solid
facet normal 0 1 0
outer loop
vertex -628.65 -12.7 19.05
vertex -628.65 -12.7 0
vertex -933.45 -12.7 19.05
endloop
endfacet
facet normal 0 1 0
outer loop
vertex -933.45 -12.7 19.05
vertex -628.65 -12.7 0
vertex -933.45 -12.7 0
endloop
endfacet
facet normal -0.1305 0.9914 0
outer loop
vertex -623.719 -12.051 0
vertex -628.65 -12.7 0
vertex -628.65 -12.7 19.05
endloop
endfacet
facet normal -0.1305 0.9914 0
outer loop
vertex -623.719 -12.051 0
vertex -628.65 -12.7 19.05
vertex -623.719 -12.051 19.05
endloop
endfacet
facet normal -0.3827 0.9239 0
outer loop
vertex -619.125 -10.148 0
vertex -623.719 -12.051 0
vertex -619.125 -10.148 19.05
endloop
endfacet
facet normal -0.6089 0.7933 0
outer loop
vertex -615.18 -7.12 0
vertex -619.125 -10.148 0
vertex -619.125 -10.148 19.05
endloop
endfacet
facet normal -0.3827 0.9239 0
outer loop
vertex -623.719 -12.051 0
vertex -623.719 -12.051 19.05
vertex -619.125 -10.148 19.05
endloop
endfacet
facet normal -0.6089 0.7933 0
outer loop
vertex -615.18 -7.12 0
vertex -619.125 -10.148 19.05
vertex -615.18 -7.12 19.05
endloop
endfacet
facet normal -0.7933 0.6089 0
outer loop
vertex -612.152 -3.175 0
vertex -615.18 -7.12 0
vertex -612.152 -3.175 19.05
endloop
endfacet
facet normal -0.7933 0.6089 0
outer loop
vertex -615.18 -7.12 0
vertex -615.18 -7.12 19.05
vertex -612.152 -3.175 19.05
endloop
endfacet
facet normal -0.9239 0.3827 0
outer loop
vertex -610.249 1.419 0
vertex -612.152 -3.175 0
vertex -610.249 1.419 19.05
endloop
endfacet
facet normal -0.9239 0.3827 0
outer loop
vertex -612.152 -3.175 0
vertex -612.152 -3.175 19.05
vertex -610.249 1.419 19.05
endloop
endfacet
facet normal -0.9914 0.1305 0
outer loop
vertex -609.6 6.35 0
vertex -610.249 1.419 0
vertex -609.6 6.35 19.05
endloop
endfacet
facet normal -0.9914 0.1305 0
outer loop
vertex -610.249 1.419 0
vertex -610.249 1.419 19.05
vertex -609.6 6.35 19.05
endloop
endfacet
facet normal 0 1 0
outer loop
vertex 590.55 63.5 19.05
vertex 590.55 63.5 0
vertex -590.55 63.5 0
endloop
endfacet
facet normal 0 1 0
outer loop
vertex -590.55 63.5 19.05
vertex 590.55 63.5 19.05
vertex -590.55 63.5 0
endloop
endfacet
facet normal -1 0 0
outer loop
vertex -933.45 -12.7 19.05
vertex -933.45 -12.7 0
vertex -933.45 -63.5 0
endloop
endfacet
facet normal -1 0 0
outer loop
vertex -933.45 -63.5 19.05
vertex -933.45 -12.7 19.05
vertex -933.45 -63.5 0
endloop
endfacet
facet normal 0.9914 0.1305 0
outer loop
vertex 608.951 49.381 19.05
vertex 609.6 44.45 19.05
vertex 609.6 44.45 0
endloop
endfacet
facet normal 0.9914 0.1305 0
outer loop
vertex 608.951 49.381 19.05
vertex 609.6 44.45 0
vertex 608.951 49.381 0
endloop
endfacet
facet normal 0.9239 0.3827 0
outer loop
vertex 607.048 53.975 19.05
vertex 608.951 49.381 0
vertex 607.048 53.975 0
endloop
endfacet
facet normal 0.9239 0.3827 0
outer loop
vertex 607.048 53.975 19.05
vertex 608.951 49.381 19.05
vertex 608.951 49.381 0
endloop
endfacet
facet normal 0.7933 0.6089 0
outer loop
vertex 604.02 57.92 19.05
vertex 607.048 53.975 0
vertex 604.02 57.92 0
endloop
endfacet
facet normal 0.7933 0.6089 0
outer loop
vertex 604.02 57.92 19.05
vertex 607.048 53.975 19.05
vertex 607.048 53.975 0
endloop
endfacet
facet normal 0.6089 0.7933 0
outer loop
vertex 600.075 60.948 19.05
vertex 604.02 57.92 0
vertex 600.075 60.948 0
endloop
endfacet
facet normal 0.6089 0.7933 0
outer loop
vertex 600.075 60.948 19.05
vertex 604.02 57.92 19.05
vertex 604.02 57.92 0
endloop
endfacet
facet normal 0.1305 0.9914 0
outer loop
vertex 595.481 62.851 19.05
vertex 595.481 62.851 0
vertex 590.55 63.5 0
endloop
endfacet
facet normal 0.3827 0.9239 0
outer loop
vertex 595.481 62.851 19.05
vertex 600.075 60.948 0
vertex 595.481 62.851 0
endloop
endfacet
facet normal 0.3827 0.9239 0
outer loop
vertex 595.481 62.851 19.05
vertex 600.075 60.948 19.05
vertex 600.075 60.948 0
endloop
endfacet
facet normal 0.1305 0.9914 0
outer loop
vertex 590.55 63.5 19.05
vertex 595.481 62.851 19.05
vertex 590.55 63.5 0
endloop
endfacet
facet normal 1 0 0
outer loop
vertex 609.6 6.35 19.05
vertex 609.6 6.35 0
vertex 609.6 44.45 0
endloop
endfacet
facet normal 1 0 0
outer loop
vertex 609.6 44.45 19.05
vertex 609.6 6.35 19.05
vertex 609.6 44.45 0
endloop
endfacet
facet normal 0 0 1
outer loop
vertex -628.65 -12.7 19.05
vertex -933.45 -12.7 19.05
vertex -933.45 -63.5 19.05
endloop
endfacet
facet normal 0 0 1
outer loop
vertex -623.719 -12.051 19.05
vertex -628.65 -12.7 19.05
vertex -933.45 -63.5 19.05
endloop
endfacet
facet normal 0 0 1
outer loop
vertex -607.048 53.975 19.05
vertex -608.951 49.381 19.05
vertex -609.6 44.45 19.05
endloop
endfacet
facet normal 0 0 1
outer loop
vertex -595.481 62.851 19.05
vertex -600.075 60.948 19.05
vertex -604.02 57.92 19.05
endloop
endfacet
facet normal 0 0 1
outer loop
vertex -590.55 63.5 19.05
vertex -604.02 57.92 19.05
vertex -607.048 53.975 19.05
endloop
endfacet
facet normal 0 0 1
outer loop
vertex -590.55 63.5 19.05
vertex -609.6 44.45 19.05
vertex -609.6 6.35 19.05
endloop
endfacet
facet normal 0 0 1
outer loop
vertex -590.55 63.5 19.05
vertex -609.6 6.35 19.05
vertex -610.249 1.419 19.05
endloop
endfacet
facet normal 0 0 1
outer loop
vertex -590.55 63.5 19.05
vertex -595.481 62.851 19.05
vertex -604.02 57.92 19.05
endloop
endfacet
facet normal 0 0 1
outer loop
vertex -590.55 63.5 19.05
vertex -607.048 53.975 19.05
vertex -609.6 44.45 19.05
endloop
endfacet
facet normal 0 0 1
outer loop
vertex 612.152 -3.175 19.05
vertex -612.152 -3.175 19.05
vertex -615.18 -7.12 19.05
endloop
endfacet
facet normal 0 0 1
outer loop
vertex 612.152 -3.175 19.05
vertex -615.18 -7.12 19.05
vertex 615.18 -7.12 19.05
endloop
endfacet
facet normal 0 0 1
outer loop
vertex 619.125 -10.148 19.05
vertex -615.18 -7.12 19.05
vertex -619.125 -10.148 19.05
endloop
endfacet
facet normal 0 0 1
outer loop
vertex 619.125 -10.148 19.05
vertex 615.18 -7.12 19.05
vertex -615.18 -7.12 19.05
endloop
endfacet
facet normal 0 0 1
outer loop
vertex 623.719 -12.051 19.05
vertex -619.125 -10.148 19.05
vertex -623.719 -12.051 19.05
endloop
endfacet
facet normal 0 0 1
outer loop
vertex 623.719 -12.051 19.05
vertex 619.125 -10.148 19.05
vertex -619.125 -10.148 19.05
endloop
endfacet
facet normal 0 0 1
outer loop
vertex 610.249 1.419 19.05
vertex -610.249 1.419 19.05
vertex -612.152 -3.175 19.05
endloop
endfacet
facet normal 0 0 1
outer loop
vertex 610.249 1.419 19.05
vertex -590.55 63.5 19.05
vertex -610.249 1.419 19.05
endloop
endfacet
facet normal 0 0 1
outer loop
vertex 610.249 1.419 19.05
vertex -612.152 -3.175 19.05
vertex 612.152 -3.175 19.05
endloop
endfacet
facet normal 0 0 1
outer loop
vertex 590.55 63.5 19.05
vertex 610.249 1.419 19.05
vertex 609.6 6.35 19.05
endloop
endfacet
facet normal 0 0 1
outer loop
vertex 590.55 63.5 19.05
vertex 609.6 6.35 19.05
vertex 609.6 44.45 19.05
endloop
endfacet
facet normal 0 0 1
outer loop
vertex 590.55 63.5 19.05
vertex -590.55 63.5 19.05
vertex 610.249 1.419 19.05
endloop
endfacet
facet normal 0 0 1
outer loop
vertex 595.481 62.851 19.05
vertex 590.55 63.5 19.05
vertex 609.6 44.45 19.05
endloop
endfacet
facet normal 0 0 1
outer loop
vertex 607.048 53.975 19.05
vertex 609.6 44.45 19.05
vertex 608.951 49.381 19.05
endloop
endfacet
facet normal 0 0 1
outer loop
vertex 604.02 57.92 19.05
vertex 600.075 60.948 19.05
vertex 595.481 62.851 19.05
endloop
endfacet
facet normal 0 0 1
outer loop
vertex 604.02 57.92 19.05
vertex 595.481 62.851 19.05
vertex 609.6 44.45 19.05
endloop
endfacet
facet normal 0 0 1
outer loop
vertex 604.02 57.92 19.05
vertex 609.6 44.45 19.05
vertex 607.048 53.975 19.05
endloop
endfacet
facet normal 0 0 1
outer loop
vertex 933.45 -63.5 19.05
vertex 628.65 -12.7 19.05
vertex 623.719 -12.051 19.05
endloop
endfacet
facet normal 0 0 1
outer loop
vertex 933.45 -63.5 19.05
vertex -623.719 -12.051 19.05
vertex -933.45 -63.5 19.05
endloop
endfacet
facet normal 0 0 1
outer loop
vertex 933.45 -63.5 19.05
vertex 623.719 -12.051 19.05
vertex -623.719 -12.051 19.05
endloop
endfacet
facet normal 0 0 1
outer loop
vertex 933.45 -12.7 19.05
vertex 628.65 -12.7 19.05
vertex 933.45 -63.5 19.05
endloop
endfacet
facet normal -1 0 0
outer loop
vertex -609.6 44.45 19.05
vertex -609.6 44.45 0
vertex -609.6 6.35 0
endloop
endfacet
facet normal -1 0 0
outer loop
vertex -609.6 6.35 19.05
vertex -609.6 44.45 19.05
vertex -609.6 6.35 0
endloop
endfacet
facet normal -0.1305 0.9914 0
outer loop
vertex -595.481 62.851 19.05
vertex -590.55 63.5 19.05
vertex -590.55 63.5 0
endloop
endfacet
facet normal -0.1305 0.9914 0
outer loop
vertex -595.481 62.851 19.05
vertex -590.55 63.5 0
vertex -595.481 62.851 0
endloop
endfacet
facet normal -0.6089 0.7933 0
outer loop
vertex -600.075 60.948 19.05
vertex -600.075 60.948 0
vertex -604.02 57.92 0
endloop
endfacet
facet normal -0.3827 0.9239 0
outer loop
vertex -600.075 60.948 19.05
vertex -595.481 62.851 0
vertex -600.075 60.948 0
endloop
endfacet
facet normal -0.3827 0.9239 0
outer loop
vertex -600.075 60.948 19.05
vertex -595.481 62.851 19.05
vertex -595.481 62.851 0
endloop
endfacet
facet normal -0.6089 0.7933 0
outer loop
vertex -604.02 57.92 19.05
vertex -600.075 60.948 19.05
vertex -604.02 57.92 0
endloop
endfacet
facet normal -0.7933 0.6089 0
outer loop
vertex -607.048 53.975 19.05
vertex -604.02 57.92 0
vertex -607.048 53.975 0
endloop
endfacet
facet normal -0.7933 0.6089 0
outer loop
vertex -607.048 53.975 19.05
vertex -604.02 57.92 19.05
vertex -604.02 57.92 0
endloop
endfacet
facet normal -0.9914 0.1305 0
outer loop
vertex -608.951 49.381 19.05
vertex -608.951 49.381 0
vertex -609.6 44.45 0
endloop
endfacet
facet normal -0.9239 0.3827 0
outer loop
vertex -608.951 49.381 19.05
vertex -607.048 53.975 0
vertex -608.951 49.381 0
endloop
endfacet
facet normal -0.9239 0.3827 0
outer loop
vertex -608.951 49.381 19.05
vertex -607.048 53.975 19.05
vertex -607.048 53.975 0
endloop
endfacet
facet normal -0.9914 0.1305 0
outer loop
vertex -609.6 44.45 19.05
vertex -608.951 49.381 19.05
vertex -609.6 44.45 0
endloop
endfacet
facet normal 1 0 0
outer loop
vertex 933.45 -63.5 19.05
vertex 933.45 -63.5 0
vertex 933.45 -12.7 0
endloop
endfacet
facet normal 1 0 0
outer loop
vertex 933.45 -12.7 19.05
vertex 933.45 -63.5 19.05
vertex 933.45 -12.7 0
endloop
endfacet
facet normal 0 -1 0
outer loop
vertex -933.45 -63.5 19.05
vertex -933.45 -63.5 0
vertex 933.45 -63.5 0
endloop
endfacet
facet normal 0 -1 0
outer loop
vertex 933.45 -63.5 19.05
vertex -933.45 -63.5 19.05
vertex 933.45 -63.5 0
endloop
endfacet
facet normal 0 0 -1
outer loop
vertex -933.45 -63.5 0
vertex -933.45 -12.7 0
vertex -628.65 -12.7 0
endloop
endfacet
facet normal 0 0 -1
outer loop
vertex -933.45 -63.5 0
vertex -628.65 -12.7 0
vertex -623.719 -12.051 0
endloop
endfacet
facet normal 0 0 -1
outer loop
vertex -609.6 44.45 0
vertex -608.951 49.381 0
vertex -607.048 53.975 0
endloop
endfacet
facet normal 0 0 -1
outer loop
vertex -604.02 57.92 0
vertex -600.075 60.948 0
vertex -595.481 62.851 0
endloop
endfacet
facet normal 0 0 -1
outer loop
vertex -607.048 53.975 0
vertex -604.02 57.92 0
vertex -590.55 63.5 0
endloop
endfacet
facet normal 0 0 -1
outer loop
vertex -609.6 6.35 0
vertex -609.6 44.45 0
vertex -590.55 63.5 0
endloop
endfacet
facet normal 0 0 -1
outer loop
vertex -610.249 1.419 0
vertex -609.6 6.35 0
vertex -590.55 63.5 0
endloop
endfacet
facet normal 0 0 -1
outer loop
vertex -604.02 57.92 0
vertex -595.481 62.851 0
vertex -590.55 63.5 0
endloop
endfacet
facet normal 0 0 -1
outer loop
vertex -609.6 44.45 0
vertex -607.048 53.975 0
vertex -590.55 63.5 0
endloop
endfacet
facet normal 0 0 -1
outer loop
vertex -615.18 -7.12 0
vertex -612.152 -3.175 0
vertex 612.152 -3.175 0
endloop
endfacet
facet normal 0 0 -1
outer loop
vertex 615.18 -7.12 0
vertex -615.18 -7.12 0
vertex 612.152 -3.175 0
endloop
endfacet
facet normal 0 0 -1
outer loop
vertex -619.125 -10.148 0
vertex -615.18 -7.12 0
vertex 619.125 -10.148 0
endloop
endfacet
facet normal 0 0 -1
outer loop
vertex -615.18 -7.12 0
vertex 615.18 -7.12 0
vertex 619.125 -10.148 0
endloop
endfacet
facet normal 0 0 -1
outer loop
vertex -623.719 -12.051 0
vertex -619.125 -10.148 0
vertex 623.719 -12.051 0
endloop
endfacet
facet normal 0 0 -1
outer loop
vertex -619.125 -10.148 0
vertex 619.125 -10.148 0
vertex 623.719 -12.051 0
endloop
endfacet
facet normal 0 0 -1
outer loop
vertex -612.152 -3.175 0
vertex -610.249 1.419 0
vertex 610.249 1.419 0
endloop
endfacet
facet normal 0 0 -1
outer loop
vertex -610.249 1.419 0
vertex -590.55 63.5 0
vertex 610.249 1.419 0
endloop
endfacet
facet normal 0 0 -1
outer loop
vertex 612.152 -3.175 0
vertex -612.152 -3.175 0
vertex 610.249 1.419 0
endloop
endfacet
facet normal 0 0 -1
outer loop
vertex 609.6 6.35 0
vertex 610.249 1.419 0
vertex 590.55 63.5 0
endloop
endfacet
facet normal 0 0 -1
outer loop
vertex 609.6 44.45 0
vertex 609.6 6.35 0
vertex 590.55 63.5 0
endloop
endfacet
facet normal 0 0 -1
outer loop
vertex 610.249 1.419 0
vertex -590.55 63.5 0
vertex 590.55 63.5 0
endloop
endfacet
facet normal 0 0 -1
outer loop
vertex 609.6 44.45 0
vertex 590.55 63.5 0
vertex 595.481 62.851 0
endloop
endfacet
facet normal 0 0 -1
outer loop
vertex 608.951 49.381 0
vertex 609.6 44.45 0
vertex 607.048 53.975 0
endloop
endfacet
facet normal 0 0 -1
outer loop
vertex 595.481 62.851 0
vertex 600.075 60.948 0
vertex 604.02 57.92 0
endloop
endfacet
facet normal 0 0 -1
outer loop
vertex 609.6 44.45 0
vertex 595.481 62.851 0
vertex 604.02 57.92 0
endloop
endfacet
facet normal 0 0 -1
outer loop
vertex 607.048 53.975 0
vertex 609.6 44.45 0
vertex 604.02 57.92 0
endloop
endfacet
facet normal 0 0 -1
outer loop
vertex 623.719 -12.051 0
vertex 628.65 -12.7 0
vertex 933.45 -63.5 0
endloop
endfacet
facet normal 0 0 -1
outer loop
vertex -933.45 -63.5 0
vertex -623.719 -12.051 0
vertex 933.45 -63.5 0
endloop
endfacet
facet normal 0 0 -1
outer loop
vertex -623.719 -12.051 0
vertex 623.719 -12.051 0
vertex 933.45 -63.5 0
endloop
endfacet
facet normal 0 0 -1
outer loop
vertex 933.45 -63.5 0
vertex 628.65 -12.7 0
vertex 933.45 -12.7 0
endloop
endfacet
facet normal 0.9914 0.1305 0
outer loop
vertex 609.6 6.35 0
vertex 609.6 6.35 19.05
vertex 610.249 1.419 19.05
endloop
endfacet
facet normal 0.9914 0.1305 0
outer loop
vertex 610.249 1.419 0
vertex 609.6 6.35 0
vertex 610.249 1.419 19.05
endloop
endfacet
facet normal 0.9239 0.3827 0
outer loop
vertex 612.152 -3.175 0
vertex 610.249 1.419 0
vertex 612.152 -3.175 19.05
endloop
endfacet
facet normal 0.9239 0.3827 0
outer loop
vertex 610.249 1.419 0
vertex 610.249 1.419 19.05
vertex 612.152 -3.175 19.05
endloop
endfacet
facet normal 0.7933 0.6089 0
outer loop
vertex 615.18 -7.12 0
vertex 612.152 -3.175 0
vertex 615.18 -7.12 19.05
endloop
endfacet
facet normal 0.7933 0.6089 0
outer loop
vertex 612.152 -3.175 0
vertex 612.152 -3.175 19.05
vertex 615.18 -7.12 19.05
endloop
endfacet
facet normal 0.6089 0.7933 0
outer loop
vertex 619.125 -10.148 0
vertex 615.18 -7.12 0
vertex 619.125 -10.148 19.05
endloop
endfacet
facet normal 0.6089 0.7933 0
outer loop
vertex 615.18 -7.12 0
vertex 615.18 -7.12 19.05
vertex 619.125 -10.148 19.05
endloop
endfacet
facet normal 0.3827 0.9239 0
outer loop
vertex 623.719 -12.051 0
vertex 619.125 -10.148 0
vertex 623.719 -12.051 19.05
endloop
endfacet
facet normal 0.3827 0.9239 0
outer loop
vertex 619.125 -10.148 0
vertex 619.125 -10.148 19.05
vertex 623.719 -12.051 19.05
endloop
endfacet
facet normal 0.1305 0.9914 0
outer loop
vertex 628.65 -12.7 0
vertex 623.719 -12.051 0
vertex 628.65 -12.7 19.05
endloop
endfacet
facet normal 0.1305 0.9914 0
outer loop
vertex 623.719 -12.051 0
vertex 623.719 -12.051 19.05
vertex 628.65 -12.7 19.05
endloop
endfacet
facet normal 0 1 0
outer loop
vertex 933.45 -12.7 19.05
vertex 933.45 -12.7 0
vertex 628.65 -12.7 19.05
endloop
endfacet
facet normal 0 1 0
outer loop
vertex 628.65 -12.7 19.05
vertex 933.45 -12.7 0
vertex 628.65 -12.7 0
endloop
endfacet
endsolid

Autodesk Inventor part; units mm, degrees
ref_plane "YZ Plane" through (0, 0, 0) normal (1, 0, 0) x (0, 1, 0)
ref_plane "XZ Plane" through (0, 0, 0) normal (0, 1, 0) x (-1, 0, 0)
ref_plane "XY Plane" through (0, 0, 0) normal (0, 0, 1) x (1, 0, 0)
sketch "Sketch1" plane through (0, 0, 0) normal (0, 0, 1) x (1, 0, 0)
  line L0 (-609.6, -63.5) -> (609.6, -63.5)
  line L1 (609.6, 63.5) -> (-609.6, 63.5)
  line L2 (-609.6, -63.5) -> (609.6, 63.5) construction
  line L3 (609.6, -63.5) -> (-609.6, 63.5) construction
  line L4 (-609.6, 63.5) -> (-609.6, -12.7)
  line L5 (-609.6, -12.7) -> (-933.45, -12.7)
  line L6 (-933.45, -12.7) -> (-933.45, -63.5)
  line L7 (-933.45, -63.5) -> (-609.6, -63.5)
  line L8 (609.6, -63.5) -> (933.45, -63.5)
  line L9 (933.45, -63.5) -> (933.45, -12.7)
  line L10 (933.45, -12.7) -> (609.6, -12.7)
  line L11 (609.6, -12.7) -> (609.6, 63.5)
  line L12 (0, 88.9) -> (0, -88.9) projected
  point P0 (0, 0)
  dimension "d0" = 127
  dimension "d1" = 1219.2
  dimension "d2" = 323.85
  dimension "d3" = 50.8
extrude "Extrusion1" add sketch "Sketch1" along normal blind 19.05
fillet "Fillet1" radius 19.05 4 edges at (-609.6, -12.7, 9.525) (-609.6, 63.5, 9.525) (609.6, 63.5, 9.525) (609.6, -12.7, 9.525)
ref_plane "Work Plane2" through (-933.45, -38.1, 19.05) normal (0, 1, 0) x (1, 0, 0)
ref_plane "Work Plane3" through (-628.65, -12.7, 0) normal (-1, 0, 0) x (0, 0, 1)
ref_plane "Work Plane4" through (628.65, -12.7, 0) normal (1, 0, 0) x (0, 0, -1)
equation "\"d2\" = ELength"
equation "\"d3\" = EHeight"
equation "\"d4\" = Thickness"
equation "\"Thickness\" = 19.05"
equation "\"EHeight\" = 50.8"
equation "\"ELength\" = 323.85"
properties part number "Frame"
